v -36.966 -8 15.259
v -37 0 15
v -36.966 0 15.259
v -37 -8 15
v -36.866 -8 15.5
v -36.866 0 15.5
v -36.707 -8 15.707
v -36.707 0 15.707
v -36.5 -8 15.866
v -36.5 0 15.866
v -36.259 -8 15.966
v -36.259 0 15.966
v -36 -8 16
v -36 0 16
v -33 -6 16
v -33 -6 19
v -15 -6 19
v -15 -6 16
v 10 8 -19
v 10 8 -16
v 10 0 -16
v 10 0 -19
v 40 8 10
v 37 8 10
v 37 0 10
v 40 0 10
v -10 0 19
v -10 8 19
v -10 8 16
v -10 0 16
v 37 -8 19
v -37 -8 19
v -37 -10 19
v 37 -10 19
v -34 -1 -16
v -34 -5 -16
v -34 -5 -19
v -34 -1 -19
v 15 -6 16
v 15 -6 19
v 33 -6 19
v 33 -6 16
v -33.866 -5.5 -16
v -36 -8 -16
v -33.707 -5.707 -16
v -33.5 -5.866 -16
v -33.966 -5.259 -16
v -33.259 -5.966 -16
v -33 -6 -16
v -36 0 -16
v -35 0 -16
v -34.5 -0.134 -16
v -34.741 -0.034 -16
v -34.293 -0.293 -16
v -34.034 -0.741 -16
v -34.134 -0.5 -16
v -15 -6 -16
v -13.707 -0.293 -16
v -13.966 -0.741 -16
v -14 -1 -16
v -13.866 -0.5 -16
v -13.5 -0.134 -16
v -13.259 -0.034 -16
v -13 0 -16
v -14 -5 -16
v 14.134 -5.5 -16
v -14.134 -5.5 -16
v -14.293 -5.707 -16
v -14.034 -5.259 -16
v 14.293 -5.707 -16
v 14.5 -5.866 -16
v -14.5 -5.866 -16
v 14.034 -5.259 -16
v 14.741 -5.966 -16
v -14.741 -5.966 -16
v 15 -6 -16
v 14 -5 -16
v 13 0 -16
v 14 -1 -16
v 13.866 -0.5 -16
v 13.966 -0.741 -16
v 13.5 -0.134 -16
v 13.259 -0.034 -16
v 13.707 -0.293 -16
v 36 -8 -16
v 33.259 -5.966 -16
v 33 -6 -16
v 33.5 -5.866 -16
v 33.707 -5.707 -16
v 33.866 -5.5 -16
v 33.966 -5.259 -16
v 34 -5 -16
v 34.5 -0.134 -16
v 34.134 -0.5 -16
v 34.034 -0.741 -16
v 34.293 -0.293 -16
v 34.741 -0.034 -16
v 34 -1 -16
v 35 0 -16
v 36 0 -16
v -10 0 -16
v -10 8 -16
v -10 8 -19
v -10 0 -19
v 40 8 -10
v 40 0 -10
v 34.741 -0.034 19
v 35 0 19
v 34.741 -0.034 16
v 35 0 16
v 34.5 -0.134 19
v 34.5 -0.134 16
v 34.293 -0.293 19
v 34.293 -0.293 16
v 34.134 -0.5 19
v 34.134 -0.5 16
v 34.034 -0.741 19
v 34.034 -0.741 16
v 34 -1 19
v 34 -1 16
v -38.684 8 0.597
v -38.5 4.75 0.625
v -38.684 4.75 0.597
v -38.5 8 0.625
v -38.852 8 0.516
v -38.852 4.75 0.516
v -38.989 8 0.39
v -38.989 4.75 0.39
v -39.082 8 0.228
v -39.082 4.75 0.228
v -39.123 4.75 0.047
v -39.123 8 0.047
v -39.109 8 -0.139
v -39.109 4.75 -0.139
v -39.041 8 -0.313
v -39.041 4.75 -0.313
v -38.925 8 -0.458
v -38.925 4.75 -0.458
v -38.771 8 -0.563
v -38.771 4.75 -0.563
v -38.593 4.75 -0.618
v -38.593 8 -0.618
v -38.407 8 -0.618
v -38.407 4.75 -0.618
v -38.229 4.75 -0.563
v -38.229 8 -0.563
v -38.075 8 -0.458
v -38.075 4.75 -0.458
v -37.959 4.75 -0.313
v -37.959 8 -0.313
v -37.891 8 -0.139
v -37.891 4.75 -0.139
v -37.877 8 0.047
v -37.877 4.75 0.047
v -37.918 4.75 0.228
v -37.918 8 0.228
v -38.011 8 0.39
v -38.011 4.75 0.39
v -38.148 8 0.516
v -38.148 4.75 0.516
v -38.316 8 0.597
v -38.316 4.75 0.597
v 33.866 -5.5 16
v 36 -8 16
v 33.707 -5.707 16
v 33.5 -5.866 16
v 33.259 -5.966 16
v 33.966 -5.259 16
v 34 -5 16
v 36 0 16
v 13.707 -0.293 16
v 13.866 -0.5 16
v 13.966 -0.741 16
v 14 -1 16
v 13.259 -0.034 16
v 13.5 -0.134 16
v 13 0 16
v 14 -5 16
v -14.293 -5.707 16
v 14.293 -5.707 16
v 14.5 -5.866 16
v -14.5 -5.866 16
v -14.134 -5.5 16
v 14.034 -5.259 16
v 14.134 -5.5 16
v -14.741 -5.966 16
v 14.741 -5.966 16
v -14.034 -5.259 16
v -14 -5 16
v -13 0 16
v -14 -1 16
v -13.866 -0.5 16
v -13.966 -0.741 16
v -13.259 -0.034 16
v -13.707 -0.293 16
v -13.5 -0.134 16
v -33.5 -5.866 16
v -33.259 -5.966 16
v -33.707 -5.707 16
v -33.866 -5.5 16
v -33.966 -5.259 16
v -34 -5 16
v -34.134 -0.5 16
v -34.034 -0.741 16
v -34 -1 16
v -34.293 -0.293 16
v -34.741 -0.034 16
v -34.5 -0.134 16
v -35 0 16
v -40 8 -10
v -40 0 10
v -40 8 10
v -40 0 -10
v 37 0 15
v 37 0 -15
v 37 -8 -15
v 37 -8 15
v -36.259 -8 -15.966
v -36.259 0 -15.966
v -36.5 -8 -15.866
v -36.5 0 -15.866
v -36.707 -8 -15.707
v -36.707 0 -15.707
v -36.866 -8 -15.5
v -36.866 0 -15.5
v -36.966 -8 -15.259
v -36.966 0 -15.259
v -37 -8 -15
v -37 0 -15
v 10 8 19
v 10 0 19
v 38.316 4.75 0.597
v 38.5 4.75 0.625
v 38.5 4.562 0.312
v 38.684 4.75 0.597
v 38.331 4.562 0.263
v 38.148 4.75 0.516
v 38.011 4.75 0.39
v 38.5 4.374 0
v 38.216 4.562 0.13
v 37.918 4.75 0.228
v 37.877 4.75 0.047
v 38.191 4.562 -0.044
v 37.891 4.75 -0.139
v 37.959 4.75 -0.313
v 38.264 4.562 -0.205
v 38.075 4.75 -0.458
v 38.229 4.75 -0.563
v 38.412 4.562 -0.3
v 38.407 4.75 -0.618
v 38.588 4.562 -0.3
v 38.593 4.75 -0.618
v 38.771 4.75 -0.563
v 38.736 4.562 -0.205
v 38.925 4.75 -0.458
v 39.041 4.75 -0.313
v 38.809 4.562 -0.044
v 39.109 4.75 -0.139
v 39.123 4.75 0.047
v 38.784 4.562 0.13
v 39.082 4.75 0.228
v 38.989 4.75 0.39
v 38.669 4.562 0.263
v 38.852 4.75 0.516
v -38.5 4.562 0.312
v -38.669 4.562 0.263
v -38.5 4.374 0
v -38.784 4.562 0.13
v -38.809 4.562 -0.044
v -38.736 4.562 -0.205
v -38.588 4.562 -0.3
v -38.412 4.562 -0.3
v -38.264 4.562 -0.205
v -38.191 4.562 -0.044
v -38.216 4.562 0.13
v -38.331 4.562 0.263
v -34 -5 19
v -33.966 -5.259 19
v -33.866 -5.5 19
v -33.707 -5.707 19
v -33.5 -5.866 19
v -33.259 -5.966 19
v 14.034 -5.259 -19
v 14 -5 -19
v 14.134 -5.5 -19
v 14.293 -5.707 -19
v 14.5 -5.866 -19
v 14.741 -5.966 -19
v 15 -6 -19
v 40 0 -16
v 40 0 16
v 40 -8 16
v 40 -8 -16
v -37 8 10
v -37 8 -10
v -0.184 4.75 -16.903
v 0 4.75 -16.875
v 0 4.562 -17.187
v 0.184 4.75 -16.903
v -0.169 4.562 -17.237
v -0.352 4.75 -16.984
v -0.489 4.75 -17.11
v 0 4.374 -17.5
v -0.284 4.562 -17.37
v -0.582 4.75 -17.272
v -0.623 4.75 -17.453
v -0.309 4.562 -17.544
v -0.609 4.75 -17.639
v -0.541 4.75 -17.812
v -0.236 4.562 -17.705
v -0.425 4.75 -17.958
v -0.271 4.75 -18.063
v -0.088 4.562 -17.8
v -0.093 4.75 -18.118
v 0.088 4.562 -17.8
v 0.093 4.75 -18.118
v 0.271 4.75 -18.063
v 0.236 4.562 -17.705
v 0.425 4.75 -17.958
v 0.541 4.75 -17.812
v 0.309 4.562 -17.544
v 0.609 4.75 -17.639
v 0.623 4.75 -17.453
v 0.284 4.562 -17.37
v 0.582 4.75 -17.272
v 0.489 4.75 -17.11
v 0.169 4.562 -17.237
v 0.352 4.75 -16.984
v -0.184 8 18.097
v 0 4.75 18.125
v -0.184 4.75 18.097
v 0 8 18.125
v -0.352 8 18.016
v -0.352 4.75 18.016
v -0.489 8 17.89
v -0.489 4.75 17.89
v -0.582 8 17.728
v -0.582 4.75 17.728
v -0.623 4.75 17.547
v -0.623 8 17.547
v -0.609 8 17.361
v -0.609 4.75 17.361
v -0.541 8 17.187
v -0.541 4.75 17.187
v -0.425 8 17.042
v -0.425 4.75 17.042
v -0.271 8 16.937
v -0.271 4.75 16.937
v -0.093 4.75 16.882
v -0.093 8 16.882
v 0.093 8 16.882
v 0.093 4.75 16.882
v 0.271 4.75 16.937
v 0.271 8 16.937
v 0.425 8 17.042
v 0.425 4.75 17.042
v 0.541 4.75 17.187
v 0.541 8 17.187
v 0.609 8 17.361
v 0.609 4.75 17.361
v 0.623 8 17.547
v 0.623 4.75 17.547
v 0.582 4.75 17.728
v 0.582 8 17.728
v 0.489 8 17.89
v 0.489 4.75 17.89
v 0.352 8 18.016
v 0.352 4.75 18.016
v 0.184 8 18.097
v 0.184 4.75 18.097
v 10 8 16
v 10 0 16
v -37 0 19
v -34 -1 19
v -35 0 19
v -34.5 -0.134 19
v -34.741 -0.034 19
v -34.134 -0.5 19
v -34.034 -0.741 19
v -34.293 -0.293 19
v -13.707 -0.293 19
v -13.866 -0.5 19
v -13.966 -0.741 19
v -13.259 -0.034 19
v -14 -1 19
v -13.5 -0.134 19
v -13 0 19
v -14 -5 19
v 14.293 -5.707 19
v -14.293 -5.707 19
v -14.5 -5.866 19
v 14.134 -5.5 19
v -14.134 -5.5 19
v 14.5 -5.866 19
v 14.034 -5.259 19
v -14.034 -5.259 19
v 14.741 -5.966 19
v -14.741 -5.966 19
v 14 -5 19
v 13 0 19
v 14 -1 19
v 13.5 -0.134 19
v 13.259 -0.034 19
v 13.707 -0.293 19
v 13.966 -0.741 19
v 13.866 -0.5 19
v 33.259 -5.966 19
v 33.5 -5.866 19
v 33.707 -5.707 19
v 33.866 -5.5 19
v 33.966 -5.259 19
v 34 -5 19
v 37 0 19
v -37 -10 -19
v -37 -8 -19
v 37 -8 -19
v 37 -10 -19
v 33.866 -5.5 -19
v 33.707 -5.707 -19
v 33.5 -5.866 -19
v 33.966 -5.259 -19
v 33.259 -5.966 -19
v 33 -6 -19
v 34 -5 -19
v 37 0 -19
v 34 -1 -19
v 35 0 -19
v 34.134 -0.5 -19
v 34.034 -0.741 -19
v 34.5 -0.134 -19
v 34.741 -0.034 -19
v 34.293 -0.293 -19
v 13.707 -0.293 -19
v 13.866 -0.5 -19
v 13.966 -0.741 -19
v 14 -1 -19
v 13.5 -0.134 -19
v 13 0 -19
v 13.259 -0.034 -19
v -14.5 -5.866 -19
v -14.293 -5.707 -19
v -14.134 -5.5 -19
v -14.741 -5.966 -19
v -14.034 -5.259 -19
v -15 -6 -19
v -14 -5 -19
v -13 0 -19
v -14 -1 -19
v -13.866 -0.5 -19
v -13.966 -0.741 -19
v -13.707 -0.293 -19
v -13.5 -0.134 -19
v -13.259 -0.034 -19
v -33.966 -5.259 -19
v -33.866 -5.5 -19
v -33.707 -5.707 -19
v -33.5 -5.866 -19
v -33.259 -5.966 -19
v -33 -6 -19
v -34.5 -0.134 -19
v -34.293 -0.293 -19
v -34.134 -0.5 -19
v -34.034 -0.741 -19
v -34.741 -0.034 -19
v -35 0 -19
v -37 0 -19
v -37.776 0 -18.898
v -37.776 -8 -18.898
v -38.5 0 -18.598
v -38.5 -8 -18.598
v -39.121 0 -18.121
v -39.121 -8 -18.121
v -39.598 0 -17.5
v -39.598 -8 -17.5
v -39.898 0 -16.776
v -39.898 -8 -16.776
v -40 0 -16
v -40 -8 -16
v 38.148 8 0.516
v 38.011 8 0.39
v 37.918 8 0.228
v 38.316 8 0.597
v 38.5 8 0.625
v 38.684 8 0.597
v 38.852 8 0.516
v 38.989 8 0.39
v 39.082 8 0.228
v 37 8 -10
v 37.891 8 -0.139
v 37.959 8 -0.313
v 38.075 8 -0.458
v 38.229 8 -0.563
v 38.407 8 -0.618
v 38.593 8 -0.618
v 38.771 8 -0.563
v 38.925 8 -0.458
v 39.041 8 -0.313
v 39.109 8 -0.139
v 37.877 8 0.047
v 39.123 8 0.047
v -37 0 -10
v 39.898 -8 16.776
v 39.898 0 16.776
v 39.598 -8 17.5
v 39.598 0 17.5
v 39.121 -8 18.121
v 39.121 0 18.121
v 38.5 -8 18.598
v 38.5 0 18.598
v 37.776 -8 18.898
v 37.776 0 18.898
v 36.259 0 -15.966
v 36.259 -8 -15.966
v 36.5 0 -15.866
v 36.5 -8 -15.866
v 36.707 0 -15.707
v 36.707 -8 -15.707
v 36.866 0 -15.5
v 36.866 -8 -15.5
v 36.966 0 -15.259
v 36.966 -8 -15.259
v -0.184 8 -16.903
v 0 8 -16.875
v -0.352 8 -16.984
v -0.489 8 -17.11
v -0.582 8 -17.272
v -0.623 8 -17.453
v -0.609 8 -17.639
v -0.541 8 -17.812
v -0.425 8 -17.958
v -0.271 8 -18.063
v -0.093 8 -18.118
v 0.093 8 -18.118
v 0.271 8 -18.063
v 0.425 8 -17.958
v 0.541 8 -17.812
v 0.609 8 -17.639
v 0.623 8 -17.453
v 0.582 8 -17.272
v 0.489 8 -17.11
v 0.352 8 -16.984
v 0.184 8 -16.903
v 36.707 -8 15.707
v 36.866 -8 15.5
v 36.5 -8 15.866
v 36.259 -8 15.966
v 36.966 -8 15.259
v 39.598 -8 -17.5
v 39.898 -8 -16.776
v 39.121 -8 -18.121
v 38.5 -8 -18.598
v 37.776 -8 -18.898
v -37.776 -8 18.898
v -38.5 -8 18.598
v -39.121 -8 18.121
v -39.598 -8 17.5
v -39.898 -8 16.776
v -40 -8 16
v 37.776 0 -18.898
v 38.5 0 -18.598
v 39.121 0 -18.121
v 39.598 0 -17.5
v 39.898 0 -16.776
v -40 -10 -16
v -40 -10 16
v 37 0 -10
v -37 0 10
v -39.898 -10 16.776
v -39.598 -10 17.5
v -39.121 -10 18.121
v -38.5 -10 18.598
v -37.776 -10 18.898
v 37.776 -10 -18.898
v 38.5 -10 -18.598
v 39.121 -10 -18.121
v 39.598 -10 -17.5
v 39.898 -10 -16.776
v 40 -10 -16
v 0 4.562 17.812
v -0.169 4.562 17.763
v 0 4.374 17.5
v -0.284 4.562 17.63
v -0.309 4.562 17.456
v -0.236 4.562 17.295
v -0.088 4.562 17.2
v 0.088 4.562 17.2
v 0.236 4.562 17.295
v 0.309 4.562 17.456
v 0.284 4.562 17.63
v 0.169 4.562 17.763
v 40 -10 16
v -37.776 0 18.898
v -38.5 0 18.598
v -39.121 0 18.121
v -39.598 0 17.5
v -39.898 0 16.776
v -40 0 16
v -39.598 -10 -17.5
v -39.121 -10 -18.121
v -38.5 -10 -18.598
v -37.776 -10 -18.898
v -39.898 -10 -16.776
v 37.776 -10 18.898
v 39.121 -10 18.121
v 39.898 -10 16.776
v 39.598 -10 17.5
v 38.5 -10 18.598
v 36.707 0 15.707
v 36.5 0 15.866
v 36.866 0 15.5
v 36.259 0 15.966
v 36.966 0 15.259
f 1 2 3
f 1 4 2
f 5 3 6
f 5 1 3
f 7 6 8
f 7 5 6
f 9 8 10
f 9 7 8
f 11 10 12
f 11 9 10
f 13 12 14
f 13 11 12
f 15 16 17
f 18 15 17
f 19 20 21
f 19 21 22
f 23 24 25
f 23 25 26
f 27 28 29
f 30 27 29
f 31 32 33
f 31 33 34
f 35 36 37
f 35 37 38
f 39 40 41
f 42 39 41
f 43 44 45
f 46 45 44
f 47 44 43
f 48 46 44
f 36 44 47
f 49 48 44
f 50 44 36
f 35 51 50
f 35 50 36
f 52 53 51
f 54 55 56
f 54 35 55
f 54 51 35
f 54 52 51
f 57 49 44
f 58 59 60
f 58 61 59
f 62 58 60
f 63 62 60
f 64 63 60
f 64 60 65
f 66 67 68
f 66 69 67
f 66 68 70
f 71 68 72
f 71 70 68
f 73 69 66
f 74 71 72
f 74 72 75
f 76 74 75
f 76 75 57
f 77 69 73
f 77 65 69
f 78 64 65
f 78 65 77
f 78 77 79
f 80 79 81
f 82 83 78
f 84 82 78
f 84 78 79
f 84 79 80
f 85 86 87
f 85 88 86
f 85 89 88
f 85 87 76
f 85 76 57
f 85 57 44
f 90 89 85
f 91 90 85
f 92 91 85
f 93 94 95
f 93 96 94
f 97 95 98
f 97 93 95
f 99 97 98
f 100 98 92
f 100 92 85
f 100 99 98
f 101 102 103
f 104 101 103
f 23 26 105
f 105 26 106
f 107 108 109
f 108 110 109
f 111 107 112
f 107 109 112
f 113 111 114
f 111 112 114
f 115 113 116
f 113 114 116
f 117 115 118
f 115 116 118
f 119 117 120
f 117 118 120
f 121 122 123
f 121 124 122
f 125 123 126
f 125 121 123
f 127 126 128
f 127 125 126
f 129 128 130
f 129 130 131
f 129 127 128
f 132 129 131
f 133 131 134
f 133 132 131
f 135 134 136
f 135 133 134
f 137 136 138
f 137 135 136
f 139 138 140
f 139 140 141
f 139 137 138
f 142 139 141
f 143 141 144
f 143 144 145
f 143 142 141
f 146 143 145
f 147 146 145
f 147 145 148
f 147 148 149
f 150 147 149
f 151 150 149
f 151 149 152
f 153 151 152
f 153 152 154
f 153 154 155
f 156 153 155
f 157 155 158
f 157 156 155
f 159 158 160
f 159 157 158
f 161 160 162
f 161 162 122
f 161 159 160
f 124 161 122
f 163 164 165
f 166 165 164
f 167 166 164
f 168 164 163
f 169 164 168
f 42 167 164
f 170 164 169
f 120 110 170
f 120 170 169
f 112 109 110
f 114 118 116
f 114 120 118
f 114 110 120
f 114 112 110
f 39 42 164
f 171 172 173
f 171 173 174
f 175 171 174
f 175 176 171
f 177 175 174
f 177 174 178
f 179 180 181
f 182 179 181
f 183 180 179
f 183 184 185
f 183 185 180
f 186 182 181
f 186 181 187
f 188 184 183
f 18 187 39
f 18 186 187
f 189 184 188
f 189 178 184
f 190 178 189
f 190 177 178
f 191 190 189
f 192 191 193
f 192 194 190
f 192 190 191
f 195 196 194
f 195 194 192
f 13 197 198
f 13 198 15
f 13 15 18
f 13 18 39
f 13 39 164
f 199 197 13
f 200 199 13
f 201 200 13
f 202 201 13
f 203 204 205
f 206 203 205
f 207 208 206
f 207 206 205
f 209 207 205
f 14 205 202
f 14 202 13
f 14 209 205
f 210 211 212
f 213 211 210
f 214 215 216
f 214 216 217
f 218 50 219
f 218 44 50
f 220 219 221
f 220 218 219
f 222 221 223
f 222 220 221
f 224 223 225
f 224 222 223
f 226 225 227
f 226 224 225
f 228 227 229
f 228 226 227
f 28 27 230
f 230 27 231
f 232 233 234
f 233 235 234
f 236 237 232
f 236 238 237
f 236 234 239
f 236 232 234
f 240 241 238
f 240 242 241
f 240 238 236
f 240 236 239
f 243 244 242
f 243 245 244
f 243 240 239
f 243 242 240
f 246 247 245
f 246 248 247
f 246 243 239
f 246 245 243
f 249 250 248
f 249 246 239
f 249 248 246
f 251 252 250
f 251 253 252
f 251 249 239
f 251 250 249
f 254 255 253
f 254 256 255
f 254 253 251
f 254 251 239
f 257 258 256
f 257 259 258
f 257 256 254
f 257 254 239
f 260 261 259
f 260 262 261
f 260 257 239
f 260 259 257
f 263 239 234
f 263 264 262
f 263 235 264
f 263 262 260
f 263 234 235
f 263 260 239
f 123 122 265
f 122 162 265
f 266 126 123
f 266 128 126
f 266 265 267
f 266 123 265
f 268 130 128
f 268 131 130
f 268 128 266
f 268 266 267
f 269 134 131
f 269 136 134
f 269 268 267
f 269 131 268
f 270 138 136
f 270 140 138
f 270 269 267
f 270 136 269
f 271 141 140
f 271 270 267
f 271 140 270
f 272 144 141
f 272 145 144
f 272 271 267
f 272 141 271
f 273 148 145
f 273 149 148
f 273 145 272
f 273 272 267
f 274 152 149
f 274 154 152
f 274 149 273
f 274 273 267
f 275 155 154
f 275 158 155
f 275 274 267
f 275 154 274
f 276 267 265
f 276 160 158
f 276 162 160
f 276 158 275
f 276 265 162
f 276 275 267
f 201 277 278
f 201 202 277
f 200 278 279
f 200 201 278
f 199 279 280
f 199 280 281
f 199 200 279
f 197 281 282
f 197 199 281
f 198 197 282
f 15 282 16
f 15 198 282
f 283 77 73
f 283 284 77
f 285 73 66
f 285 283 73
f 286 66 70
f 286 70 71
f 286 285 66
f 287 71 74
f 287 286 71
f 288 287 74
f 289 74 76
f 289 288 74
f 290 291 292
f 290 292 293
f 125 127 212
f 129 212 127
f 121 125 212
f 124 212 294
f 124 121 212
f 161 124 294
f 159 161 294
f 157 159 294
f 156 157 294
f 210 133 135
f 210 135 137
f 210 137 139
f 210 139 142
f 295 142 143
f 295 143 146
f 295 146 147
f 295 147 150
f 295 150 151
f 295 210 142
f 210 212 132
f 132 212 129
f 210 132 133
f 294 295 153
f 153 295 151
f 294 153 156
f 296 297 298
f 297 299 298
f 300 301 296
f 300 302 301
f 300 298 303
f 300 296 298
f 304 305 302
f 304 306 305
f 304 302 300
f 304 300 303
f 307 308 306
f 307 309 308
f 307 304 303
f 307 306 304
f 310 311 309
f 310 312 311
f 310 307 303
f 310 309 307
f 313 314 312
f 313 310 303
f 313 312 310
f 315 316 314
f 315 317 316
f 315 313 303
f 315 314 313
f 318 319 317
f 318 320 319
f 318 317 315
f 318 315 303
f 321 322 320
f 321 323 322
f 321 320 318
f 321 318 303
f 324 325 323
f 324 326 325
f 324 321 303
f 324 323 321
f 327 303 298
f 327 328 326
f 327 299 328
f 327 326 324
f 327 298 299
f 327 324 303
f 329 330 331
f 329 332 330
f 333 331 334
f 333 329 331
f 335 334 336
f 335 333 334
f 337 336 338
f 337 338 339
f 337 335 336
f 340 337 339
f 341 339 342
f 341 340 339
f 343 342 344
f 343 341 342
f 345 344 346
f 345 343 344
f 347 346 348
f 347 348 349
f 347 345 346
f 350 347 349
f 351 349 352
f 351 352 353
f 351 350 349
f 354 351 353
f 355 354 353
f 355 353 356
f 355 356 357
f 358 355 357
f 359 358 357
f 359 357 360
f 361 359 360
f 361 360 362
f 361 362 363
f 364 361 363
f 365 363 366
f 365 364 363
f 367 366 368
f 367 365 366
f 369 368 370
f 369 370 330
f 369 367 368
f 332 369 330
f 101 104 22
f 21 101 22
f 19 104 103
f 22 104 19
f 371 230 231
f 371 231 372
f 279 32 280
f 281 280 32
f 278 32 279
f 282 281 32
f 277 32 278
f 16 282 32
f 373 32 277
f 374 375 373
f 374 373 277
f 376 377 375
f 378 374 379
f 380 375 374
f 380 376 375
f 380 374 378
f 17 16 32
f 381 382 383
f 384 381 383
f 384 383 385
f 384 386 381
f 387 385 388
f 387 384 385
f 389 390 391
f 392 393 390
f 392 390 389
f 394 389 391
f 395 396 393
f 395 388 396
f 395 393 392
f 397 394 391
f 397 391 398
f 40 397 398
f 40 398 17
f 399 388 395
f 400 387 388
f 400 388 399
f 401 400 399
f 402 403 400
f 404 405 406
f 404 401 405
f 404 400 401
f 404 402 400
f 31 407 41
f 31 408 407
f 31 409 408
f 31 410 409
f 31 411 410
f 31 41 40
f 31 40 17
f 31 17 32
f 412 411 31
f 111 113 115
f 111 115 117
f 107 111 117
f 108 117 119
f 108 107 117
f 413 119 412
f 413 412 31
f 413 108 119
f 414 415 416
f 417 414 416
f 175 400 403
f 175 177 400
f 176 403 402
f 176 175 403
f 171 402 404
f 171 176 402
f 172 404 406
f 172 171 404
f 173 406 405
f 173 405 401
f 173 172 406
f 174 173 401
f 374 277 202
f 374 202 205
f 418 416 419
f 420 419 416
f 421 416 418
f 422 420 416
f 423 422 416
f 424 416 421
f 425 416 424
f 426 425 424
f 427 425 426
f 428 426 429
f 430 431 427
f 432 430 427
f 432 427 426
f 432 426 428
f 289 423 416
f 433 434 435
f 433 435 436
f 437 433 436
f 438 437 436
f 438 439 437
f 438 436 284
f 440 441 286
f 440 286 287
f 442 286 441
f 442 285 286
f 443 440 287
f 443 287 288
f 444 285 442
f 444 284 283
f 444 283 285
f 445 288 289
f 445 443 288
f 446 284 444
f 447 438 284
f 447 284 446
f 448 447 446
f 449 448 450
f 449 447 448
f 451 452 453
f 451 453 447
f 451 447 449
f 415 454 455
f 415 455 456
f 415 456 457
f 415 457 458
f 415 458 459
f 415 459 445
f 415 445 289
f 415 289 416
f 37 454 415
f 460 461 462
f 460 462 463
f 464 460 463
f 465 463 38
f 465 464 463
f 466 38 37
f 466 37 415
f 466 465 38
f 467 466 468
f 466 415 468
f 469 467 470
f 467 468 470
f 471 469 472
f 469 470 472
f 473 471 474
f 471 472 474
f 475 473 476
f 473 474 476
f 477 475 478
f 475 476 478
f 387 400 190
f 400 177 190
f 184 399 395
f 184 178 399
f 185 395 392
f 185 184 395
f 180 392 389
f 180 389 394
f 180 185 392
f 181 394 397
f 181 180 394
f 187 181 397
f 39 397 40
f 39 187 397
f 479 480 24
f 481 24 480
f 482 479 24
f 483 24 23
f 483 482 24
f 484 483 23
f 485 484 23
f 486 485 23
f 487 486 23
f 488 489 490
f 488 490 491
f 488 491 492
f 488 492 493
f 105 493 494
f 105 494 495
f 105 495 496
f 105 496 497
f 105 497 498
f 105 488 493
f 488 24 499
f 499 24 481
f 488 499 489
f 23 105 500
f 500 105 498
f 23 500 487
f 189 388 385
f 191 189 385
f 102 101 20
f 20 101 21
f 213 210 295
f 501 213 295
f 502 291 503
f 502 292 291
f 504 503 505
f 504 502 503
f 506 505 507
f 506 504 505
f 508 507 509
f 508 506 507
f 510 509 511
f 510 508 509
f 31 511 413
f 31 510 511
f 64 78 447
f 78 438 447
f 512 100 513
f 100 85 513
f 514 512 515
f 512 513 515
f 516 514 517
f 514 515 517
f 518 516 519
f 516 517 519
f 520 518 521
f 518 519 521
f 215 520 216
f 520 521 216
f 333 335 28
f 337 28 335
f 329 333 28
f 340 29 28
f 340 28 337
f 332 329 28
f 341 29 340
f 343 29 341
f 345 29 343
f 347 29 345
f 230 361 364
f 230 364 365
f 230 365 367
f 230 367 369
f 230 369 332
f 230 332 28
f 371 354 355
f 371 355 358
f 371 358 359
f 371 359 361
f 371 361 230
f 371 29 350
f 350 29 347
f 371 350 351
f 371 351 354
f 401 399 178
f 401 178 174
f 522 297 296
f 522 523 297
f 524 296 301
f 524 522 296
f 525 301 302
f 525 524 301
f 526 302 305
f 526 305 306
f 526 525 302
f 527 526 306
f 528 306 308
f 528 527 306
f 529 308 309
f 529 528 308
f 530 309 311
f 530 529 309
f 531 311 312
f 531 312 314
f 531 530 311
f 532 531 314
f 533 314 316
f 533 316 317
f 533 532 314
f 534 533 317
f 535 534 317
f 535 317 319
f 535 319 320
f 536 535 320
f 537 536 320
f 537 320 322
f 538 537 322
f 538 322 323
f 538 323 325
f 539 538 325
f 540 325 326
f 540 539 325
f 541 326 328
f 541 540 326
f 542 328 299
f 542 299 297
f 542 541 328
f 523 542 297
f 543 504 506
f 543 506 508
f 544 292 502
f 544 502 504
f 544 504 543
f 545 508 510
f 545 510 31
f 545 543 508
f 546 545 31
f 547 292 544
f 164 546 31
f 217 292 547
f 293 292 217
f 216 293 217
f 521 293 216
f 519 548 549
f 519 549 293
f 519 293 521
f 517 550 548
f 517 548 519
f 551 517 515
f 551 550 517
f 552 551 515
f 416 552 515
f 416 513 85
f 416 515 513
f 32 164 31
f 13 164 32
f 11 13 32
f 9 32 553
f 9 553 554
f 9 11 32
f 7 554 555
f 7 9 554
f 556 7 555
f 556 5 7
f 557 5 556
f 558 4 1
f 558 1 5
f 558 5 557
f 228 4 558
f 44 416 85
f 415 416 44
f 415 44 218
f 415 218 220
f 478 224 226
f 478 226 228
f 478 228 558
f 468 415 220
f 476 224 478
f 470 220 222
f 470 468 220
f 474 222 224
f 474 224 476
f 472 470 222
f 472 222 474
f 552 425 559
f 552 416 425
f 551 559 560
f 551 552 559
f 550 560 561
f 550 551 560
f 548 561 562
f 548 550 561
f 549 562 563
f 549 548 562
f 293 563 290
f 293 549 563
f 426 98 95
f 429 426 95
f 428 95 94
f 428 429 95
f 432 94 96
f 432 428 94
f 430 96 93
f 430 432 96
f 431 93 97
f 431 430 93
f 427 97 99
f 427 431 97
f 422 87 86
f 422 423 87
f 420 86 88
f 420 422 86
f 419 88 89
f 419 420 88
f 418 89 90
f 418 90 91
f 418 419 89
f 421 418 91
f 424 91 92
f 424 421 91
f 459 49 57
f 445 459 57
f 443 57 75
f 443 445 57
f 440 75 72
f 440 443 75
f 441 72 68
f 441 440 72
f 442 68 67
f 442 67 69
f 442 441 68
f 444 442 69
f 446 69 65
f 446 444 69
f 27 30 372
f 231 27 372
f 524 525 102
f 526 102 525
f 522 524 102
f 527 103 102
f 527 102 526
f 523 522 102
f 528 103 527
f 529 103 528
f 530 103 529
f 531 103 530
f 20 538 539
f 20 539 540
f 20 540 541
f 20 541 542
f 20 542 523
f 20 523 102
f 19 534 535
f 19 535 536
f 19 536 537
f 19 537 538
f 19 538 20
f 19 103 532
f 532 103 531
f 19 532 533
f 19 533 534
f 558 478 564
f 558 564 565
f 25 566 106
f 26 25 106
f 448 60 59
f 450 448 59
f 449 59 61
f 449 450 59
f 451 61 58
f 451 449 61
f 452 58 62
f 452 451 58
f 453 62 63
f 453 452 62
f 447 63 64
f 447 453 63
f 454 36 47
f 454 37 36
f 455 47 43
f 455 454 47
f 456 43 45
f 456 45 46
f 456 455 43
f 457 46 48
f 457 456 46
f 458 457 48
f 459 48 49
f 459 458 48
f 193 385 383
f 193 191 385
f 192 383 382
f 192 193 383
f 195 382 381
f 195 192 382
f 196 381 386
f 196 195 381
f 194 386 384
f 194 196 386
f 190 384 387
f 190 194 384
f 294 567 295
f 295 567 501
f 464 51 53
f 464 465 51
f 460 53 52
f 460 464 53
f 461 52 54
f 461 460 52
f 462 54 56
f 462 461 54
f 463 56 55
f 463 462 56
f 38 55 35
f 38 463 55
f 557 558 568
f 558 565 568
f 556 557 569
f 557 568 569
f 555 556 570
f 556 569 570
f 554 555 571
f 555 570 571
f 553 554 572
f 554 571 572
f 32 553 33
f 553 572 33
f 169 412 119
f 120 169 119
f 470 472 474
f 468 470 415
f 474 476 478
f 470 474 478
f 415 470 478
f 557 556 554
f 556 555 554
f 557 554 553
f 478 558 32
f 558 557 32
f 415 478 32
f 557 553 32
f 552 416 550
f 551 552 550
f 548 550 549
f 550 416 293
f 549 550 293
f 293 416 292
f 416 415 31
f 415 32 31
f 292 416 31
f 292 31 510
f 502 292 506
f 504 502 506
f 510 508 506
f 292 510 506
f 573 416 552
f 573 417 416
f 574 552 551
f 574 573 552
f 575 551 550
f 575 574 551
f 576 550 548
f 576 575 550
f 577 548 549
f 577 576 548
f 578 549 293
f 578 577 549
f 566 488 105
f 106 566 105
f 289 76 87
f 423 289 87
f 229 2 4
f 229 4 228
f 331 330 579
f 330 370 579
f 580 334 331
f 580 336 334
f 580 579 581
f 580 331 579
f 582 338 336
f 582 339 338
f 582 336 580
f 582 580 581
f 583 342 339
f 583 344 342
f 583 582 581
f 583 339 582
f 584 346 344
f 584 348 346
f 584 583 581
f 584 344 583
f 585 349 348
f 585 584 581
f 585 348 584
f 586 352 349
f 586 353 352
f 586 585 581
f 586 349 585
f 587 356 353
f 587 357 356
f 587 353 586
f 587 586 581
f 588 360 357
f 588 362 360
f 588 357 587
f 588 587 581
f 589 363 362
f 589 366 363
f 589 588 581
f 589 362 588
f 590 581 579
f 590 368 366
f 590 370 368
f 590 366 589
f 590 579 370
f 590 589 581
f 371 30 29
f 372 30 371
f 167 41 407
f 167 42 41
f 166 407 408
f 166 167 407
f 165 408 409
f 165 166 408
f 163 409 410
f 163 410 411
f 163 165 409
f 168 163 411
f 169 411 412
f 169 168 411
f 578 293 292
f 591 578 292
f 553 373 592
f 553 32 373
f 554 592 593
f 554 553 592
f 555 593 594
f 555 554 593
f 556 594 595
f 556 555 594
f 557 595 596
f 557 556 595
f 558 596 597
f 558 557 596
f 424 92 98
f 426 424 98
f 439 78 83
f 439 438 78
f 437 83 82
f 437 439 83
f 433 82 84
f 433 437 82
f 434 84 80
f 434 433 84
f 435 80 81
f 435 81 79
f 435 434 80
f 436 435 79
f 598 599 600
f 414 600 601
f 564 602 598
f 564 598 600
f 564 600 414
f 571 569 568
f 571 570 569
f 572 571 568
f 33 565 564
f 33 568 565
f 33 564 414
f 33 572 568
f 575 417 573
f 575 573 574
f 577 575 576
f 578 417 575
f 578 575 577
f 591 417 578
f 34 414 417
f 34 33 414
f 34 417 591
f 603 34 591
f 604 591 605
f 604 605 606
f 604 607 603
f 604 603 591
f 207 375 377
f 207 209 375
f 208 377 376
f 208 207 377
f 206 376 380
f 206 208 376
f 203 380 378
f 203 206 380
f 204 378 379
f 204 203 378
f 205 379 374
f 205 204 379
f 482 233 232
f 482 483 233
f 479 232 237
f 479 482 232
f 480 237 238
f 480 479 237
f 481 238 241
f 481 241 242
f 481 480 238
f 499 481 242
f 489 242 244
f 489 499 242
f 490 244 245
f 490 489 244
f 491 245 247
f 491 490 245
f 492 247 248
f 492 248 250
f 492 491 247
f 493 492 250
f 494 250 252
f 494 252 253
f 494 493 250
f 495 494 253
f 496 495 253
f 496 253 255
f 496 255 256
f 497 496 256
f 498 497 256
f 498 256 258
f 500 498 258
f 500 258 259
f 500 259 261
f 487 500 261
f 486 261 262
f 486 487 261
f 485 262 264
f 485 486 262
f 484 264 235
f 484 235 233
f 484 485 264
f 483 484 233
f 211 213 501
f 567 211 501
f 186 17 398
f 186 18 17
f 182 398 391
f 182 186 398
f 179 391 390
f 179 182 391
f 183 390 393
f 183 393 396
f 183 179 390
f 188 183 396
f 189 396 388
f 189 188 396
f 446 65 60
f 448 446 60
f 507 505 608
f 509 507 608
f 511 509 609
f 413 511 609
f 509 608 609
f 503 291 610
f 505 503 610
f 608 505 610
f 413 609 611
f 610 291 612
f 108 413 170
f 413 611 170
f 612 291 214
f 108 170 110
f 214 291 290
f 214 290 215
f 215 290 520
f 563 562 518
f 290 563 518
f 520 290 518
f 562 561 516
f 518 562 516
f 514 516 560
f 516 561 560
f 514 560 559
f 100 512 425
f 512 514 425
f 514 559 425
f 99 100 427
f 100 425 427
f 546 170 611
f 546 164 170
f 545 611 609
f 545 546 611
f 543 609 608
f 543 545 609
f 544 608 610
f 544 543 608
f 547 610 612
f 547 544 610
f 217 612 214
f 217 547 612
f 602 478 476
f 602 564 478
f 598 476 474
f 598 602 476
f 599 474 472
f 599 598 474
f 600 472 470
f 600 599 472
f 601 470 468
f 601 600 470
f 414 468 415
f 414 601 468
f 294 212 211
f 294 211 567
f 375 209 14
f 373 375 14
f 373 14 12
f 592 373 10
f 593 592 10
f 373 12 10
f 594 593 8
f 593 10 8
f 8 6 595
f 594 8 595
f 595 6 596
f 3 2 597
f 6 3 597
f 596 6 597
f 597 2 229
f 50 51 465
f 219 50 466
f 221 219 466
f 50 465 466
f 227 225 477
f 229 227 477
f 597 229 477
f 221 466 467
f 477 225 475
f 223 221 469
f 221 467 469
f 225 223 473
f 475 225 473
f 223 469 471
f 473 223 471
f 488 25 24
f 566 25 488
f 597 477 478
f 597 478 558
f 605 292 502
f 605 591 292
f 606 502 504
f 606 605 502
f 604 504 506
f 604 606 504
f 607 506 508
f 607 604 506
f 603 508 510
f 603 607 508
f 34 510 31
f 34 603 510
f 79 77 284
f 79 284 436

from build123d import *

# Parameters (mm, degrees)
SKETCH1_W                         = 3
SKETCH1_H                         = 20
SKETCH1_W_2                       = 20
SKETCH1_H_2                       = 3
BOSS_EXTRUDE1_DEPTH               = 8
SKETCH1_4_W                       = 3
SKETCH1_4_H                       = 20
BOSS_EXTRUDE4_DEPTH               = 8
SKETCH1_4_W_2                     = 20
SKETCH1_4_H_2                     = 3
BOSS_EXTRUDE4_2_DEPTH             = 8
BOSS_EXTRUDE4_3_DEPTH             = 8
BOSS_EXTRUDE4_4_DEPTH             = 8
SKETCH2_W                         = 80
SKETCH2_H                         = 38
BOSS_EXTRUDE2_DEPTH               = 2
FILLET2_R                         = 3
FILLET1_R                         = 3
FILLET3_R                         = 1
SKETCH4_W                         = 20
SKETCH4_H                         = 6
CUT_EXTRUDE1_DEPTH                = 1
CUT_EXTRUDE1_DEPTH_BACK           = 39
FILLET4_R                         = 1
M1_6X0_35_TAPPED_HOLE1_AT_2_COUNT = 2
M1_6X0_35_TAPPED_HOLE1_AT_2_PITCH = 42.290660908
M1_6X0_35_TAPPED_HOLE1_AT_3_COUNT = 2
M1_6X0_35_TAPPED_HOLE1_AT_3_PITCH = 42.290660908
M1_6X0_35_TAPPED_HOLE1_AT_4_COUNT = 2
M1_6X0_35_TAPPED_HOLE1_AT_4_PITCH = 77


with BuildPart() as part:
    # Sketch1 → Boss-Extrude1 (new body)
    with BuildSketch(Plane(origin=(0, 0, 0), x_dir=(1, 0, 0), z_dir=(0, 1, 0))):
        Polygon((-40, 19), (-10, 19), (-10, 16), (-37, 16), (-37, 10), (-40, 10), align=None)
        with Locations((-38.5, 0)):
            Rectangle(SKETCH1_W, SKETCH1_H)
        Polygon((-40, -19), (-10, -19), (-10, -16), (-37, -16), (-37, -10), (-40, -10), align=None)
        with Locations((0, -17.5)):
            Rectangle(SKETCH1_W_2, SKETCH1_H_2)
        Polygon((40, -10), (40, -19), (10, -19), (10, -16), (37, -16), (37, -10), align=None)
        with Locations((38.5, 0)):
            Rectangle(SKETCH1_W, SKETCH1_H)
        Polygon((40, 10), (37, 10), (37, 16), (10, 16), (10, 19), (40, 19), align=None)
        with Locations((0, 17.5)):
            Rectangle(SKETCH1_W_2, SKETCH1_H_2)
    extrude(amount=-BOSS_EXTRUDE1_DEPTH)

    # Fillet1
    fillet1_edges = [part.edges().sort_by_distance(p)[0] for p in [
        (40, -4, -19),
        (40, -4, 19),
        (-40, -4, 19),
        (-40, -4, -19),
    ]]
    fillet(fillet1_edges, radius=FILLET1_R)

    # Fillet3
    fillet3_edges = [part.edges().sort_by_distance(p)[0] for p in [
        (37, -4, -16),
        (-37, -4, -16),
        (-37, -4, 16),
        (37, -4, 16),
    ]]
    fillet(fillet3_edges, radius=FILLET3_R)

    # Sketch4 → Cut-Extrude1 (cut, two sides)
    with BuildSketch(Plane.XY.offset(19)) as cut_extrude1_sk:
        with Locations((-24, -3)):
            Rectangle(SKETCH4_W, SKETCH4_H)
        with Locations((24, -3)):
            Rectangle(SKETCH4_W, SKETCH4_H)
    extrude(amount=CUT_EXTRUDE1_DEPTH, mode=Mode.SUBTRACT)
    extrude(cut_extrude1_sk.sketch, amount=-CUT_EXTRUDE1_DEPTH_BACK, mode=Mode.SUBTRACT)

    # Fillet4
    fillet4_edges = [part.edges().sort_by_distance(p)[0] for p in [
        (14, 0, 17.5),
        (34, 0, 17.5),
        (-34, 0, 17.5),
        (-14, 0, 17.5),
        (-14, -6, 17.5),
        (-34, -6, 17.5),
        (-14, 0, -17.5),
        (-14, -6, -17.5),
        (-34, -6, -17.5),
        (-34, 0, -17.5),
        (34, -6, 17.5),
        (14, -6, 17.5),
        (34, 0, -17.5),
        (34, -6, -17.5),
        (14, -6, -17.5),
        (14, 0, -17.5),
    ]]
    fillet(fillet4_edges, radius=FILLET4_R)


with BuildPart() as body_2:
    # Sketch1<4> → Boss-Extrude4 (new body)
    with BuildSketch(Plane(origin=(0, 0, 0), x_dir=(1, 0, 0), z_dir=(0, 1, 0))):
        with Locations((-38.5, 0)):
            Rectangle(SKETCH1_4_W, SKETCH1_4_H)
    extrude(amount=BOSS_EXTRUDE4_DEPTH)


with BuildPart() as body_3:
    # Sketch1<4> → Boss-Extrude4 2 (new body)
    with BuildSketch(Plane(origin=(0, 0, 0), x_dir=(1, 0, 0), z_dir=(0, 1, 0))):
        with Locations((0, 17.5)):
            Rectangle(SKETCH1_4_W_2, SKETCH1_4_H_2)
    extrude(amount=BOSS_EXTRUDE4_2_DEPTH)


with BuildPart() as body_4:
    # Sketch1<4> → Boss-Extrude4 3 (new body)
    with BuildSketch(Plane(origin=(0, 0, 0), x_dir=(1, 0, 0), z_dir=(0, 1, 0))):
        with Locations((0, -17.5)):
            Rectangle(SKETCH1_4_W_2, SKETCH1_4_H_2)
    extrude(amount=BOSS_EXTRUDE4_3_DEPTH)


with BuildPart() as body_5:
    # Sketch1<4> → Boss-Extrude4 4 (new body)
    with BuildSketch(Plane(origin=(0, 0, 0), x_dir=(1, 0, 0), z_dir=(0, 1, 0))):
        with Locations((38.5, 0)):
            Rectangle(SKETCH1_4_W, SKETCH1_4_H)
    extrude(amount=BOSS_EXTRUDE4_4_DEPTH)

    # Sketch6 → M1.6x0.35 Tapped Hole1 (revolve, cut)
    with BuildSketch(Plane(origin=(38.5, 8, 0), x_dir=(0, 0, 1), z_dir=(1, 0, 0))):
        Polygon((0, 0), (0, 3.625537887), (0.625, 3.25), (0.625, 0), align=None)
    m1_6x0_35_tapped_hole1 = revolve(axis=Axis((38.5, 14.35, 0), (0, -1, 0)), mode=Mode.SUBTRACT)


with BuildPart() as body_6:
    # Sketch2 → Boss-Extrude2 (new body)
    with BuildSketch(Plane.XZ.offset(8)):
        Rectangle(SKETCH2_W, SKETCH2_H)
    extrude(amount=BOSS_EXTRUDE2_DEPTH)

    # Fillet2
    fillet2_edges = [body_6.edges().sort_by_distance(p)[0] for p in [
        (-40, -9, 19),
        (40, -9, 19),
        (40, -9, -19),
        (-40, -9, -19),
    ]]
    fillet(fillet2_edges, radius=FILLET2_R)


with BuildPart() as body_3_1:
    add(body_3.part)

    # M1.6x0.35 Tapped Hole1 at 2: M1.6x0.35 Tapped Hole1 ×2
    with Locations(*[Vector(-0.910366477, 0, -0.413802944) * (i * M1_6X0_35_TAPPED_HOLE1_AT_2_PITCH) for i in range(1, M1_6X0_35_TAPPED_HOLE1_AT_2_COUNT)]):
        add(m1_6x0_35_tapped_hole1, mode=Mode.SUBTRACT)


with BuildPart() as body_4_1:
    add(body_4.part)

    # M1.6x0.35 Tapped Hole1 at 3: M1.6x0.35 Tapped Hole1 ×2
    with Locations(*[Vector(-0.910366477, 0, 0.413802944) * (i * M1_6X0_35_TAPPED_HOLE1_AT_3_PITCH) for i in range(1, M1_6X0_35_TAPPED_HOLE1_AT_3_COUNT)]):
        add(m1_6x0_35_tapped_hole1, mode=Mode.SUBTRACT)


with BuildPart() as body_2_1:
    add(body_2.part)

    # M1.6x0.35 Tapped Hole1 at 4: M1.6x0.35 Tapped Hole1 ×2
    with Locations(*[(-i * M1_6X0_35_TAPPED_HOLE1_AT_4_PITCH, 0, 0) for i in range(1, M1_6X0_35_TAPPED_HOLE1_AT_4_COUNT)]):
        add(m1_6x0_35_tapped_hole1, mode=Mode.SUBTRACT)


solid = Compound([part.part, body_5.part, body_6.part, body_3_1.part, body_4_1.part, body_2_1.part])
